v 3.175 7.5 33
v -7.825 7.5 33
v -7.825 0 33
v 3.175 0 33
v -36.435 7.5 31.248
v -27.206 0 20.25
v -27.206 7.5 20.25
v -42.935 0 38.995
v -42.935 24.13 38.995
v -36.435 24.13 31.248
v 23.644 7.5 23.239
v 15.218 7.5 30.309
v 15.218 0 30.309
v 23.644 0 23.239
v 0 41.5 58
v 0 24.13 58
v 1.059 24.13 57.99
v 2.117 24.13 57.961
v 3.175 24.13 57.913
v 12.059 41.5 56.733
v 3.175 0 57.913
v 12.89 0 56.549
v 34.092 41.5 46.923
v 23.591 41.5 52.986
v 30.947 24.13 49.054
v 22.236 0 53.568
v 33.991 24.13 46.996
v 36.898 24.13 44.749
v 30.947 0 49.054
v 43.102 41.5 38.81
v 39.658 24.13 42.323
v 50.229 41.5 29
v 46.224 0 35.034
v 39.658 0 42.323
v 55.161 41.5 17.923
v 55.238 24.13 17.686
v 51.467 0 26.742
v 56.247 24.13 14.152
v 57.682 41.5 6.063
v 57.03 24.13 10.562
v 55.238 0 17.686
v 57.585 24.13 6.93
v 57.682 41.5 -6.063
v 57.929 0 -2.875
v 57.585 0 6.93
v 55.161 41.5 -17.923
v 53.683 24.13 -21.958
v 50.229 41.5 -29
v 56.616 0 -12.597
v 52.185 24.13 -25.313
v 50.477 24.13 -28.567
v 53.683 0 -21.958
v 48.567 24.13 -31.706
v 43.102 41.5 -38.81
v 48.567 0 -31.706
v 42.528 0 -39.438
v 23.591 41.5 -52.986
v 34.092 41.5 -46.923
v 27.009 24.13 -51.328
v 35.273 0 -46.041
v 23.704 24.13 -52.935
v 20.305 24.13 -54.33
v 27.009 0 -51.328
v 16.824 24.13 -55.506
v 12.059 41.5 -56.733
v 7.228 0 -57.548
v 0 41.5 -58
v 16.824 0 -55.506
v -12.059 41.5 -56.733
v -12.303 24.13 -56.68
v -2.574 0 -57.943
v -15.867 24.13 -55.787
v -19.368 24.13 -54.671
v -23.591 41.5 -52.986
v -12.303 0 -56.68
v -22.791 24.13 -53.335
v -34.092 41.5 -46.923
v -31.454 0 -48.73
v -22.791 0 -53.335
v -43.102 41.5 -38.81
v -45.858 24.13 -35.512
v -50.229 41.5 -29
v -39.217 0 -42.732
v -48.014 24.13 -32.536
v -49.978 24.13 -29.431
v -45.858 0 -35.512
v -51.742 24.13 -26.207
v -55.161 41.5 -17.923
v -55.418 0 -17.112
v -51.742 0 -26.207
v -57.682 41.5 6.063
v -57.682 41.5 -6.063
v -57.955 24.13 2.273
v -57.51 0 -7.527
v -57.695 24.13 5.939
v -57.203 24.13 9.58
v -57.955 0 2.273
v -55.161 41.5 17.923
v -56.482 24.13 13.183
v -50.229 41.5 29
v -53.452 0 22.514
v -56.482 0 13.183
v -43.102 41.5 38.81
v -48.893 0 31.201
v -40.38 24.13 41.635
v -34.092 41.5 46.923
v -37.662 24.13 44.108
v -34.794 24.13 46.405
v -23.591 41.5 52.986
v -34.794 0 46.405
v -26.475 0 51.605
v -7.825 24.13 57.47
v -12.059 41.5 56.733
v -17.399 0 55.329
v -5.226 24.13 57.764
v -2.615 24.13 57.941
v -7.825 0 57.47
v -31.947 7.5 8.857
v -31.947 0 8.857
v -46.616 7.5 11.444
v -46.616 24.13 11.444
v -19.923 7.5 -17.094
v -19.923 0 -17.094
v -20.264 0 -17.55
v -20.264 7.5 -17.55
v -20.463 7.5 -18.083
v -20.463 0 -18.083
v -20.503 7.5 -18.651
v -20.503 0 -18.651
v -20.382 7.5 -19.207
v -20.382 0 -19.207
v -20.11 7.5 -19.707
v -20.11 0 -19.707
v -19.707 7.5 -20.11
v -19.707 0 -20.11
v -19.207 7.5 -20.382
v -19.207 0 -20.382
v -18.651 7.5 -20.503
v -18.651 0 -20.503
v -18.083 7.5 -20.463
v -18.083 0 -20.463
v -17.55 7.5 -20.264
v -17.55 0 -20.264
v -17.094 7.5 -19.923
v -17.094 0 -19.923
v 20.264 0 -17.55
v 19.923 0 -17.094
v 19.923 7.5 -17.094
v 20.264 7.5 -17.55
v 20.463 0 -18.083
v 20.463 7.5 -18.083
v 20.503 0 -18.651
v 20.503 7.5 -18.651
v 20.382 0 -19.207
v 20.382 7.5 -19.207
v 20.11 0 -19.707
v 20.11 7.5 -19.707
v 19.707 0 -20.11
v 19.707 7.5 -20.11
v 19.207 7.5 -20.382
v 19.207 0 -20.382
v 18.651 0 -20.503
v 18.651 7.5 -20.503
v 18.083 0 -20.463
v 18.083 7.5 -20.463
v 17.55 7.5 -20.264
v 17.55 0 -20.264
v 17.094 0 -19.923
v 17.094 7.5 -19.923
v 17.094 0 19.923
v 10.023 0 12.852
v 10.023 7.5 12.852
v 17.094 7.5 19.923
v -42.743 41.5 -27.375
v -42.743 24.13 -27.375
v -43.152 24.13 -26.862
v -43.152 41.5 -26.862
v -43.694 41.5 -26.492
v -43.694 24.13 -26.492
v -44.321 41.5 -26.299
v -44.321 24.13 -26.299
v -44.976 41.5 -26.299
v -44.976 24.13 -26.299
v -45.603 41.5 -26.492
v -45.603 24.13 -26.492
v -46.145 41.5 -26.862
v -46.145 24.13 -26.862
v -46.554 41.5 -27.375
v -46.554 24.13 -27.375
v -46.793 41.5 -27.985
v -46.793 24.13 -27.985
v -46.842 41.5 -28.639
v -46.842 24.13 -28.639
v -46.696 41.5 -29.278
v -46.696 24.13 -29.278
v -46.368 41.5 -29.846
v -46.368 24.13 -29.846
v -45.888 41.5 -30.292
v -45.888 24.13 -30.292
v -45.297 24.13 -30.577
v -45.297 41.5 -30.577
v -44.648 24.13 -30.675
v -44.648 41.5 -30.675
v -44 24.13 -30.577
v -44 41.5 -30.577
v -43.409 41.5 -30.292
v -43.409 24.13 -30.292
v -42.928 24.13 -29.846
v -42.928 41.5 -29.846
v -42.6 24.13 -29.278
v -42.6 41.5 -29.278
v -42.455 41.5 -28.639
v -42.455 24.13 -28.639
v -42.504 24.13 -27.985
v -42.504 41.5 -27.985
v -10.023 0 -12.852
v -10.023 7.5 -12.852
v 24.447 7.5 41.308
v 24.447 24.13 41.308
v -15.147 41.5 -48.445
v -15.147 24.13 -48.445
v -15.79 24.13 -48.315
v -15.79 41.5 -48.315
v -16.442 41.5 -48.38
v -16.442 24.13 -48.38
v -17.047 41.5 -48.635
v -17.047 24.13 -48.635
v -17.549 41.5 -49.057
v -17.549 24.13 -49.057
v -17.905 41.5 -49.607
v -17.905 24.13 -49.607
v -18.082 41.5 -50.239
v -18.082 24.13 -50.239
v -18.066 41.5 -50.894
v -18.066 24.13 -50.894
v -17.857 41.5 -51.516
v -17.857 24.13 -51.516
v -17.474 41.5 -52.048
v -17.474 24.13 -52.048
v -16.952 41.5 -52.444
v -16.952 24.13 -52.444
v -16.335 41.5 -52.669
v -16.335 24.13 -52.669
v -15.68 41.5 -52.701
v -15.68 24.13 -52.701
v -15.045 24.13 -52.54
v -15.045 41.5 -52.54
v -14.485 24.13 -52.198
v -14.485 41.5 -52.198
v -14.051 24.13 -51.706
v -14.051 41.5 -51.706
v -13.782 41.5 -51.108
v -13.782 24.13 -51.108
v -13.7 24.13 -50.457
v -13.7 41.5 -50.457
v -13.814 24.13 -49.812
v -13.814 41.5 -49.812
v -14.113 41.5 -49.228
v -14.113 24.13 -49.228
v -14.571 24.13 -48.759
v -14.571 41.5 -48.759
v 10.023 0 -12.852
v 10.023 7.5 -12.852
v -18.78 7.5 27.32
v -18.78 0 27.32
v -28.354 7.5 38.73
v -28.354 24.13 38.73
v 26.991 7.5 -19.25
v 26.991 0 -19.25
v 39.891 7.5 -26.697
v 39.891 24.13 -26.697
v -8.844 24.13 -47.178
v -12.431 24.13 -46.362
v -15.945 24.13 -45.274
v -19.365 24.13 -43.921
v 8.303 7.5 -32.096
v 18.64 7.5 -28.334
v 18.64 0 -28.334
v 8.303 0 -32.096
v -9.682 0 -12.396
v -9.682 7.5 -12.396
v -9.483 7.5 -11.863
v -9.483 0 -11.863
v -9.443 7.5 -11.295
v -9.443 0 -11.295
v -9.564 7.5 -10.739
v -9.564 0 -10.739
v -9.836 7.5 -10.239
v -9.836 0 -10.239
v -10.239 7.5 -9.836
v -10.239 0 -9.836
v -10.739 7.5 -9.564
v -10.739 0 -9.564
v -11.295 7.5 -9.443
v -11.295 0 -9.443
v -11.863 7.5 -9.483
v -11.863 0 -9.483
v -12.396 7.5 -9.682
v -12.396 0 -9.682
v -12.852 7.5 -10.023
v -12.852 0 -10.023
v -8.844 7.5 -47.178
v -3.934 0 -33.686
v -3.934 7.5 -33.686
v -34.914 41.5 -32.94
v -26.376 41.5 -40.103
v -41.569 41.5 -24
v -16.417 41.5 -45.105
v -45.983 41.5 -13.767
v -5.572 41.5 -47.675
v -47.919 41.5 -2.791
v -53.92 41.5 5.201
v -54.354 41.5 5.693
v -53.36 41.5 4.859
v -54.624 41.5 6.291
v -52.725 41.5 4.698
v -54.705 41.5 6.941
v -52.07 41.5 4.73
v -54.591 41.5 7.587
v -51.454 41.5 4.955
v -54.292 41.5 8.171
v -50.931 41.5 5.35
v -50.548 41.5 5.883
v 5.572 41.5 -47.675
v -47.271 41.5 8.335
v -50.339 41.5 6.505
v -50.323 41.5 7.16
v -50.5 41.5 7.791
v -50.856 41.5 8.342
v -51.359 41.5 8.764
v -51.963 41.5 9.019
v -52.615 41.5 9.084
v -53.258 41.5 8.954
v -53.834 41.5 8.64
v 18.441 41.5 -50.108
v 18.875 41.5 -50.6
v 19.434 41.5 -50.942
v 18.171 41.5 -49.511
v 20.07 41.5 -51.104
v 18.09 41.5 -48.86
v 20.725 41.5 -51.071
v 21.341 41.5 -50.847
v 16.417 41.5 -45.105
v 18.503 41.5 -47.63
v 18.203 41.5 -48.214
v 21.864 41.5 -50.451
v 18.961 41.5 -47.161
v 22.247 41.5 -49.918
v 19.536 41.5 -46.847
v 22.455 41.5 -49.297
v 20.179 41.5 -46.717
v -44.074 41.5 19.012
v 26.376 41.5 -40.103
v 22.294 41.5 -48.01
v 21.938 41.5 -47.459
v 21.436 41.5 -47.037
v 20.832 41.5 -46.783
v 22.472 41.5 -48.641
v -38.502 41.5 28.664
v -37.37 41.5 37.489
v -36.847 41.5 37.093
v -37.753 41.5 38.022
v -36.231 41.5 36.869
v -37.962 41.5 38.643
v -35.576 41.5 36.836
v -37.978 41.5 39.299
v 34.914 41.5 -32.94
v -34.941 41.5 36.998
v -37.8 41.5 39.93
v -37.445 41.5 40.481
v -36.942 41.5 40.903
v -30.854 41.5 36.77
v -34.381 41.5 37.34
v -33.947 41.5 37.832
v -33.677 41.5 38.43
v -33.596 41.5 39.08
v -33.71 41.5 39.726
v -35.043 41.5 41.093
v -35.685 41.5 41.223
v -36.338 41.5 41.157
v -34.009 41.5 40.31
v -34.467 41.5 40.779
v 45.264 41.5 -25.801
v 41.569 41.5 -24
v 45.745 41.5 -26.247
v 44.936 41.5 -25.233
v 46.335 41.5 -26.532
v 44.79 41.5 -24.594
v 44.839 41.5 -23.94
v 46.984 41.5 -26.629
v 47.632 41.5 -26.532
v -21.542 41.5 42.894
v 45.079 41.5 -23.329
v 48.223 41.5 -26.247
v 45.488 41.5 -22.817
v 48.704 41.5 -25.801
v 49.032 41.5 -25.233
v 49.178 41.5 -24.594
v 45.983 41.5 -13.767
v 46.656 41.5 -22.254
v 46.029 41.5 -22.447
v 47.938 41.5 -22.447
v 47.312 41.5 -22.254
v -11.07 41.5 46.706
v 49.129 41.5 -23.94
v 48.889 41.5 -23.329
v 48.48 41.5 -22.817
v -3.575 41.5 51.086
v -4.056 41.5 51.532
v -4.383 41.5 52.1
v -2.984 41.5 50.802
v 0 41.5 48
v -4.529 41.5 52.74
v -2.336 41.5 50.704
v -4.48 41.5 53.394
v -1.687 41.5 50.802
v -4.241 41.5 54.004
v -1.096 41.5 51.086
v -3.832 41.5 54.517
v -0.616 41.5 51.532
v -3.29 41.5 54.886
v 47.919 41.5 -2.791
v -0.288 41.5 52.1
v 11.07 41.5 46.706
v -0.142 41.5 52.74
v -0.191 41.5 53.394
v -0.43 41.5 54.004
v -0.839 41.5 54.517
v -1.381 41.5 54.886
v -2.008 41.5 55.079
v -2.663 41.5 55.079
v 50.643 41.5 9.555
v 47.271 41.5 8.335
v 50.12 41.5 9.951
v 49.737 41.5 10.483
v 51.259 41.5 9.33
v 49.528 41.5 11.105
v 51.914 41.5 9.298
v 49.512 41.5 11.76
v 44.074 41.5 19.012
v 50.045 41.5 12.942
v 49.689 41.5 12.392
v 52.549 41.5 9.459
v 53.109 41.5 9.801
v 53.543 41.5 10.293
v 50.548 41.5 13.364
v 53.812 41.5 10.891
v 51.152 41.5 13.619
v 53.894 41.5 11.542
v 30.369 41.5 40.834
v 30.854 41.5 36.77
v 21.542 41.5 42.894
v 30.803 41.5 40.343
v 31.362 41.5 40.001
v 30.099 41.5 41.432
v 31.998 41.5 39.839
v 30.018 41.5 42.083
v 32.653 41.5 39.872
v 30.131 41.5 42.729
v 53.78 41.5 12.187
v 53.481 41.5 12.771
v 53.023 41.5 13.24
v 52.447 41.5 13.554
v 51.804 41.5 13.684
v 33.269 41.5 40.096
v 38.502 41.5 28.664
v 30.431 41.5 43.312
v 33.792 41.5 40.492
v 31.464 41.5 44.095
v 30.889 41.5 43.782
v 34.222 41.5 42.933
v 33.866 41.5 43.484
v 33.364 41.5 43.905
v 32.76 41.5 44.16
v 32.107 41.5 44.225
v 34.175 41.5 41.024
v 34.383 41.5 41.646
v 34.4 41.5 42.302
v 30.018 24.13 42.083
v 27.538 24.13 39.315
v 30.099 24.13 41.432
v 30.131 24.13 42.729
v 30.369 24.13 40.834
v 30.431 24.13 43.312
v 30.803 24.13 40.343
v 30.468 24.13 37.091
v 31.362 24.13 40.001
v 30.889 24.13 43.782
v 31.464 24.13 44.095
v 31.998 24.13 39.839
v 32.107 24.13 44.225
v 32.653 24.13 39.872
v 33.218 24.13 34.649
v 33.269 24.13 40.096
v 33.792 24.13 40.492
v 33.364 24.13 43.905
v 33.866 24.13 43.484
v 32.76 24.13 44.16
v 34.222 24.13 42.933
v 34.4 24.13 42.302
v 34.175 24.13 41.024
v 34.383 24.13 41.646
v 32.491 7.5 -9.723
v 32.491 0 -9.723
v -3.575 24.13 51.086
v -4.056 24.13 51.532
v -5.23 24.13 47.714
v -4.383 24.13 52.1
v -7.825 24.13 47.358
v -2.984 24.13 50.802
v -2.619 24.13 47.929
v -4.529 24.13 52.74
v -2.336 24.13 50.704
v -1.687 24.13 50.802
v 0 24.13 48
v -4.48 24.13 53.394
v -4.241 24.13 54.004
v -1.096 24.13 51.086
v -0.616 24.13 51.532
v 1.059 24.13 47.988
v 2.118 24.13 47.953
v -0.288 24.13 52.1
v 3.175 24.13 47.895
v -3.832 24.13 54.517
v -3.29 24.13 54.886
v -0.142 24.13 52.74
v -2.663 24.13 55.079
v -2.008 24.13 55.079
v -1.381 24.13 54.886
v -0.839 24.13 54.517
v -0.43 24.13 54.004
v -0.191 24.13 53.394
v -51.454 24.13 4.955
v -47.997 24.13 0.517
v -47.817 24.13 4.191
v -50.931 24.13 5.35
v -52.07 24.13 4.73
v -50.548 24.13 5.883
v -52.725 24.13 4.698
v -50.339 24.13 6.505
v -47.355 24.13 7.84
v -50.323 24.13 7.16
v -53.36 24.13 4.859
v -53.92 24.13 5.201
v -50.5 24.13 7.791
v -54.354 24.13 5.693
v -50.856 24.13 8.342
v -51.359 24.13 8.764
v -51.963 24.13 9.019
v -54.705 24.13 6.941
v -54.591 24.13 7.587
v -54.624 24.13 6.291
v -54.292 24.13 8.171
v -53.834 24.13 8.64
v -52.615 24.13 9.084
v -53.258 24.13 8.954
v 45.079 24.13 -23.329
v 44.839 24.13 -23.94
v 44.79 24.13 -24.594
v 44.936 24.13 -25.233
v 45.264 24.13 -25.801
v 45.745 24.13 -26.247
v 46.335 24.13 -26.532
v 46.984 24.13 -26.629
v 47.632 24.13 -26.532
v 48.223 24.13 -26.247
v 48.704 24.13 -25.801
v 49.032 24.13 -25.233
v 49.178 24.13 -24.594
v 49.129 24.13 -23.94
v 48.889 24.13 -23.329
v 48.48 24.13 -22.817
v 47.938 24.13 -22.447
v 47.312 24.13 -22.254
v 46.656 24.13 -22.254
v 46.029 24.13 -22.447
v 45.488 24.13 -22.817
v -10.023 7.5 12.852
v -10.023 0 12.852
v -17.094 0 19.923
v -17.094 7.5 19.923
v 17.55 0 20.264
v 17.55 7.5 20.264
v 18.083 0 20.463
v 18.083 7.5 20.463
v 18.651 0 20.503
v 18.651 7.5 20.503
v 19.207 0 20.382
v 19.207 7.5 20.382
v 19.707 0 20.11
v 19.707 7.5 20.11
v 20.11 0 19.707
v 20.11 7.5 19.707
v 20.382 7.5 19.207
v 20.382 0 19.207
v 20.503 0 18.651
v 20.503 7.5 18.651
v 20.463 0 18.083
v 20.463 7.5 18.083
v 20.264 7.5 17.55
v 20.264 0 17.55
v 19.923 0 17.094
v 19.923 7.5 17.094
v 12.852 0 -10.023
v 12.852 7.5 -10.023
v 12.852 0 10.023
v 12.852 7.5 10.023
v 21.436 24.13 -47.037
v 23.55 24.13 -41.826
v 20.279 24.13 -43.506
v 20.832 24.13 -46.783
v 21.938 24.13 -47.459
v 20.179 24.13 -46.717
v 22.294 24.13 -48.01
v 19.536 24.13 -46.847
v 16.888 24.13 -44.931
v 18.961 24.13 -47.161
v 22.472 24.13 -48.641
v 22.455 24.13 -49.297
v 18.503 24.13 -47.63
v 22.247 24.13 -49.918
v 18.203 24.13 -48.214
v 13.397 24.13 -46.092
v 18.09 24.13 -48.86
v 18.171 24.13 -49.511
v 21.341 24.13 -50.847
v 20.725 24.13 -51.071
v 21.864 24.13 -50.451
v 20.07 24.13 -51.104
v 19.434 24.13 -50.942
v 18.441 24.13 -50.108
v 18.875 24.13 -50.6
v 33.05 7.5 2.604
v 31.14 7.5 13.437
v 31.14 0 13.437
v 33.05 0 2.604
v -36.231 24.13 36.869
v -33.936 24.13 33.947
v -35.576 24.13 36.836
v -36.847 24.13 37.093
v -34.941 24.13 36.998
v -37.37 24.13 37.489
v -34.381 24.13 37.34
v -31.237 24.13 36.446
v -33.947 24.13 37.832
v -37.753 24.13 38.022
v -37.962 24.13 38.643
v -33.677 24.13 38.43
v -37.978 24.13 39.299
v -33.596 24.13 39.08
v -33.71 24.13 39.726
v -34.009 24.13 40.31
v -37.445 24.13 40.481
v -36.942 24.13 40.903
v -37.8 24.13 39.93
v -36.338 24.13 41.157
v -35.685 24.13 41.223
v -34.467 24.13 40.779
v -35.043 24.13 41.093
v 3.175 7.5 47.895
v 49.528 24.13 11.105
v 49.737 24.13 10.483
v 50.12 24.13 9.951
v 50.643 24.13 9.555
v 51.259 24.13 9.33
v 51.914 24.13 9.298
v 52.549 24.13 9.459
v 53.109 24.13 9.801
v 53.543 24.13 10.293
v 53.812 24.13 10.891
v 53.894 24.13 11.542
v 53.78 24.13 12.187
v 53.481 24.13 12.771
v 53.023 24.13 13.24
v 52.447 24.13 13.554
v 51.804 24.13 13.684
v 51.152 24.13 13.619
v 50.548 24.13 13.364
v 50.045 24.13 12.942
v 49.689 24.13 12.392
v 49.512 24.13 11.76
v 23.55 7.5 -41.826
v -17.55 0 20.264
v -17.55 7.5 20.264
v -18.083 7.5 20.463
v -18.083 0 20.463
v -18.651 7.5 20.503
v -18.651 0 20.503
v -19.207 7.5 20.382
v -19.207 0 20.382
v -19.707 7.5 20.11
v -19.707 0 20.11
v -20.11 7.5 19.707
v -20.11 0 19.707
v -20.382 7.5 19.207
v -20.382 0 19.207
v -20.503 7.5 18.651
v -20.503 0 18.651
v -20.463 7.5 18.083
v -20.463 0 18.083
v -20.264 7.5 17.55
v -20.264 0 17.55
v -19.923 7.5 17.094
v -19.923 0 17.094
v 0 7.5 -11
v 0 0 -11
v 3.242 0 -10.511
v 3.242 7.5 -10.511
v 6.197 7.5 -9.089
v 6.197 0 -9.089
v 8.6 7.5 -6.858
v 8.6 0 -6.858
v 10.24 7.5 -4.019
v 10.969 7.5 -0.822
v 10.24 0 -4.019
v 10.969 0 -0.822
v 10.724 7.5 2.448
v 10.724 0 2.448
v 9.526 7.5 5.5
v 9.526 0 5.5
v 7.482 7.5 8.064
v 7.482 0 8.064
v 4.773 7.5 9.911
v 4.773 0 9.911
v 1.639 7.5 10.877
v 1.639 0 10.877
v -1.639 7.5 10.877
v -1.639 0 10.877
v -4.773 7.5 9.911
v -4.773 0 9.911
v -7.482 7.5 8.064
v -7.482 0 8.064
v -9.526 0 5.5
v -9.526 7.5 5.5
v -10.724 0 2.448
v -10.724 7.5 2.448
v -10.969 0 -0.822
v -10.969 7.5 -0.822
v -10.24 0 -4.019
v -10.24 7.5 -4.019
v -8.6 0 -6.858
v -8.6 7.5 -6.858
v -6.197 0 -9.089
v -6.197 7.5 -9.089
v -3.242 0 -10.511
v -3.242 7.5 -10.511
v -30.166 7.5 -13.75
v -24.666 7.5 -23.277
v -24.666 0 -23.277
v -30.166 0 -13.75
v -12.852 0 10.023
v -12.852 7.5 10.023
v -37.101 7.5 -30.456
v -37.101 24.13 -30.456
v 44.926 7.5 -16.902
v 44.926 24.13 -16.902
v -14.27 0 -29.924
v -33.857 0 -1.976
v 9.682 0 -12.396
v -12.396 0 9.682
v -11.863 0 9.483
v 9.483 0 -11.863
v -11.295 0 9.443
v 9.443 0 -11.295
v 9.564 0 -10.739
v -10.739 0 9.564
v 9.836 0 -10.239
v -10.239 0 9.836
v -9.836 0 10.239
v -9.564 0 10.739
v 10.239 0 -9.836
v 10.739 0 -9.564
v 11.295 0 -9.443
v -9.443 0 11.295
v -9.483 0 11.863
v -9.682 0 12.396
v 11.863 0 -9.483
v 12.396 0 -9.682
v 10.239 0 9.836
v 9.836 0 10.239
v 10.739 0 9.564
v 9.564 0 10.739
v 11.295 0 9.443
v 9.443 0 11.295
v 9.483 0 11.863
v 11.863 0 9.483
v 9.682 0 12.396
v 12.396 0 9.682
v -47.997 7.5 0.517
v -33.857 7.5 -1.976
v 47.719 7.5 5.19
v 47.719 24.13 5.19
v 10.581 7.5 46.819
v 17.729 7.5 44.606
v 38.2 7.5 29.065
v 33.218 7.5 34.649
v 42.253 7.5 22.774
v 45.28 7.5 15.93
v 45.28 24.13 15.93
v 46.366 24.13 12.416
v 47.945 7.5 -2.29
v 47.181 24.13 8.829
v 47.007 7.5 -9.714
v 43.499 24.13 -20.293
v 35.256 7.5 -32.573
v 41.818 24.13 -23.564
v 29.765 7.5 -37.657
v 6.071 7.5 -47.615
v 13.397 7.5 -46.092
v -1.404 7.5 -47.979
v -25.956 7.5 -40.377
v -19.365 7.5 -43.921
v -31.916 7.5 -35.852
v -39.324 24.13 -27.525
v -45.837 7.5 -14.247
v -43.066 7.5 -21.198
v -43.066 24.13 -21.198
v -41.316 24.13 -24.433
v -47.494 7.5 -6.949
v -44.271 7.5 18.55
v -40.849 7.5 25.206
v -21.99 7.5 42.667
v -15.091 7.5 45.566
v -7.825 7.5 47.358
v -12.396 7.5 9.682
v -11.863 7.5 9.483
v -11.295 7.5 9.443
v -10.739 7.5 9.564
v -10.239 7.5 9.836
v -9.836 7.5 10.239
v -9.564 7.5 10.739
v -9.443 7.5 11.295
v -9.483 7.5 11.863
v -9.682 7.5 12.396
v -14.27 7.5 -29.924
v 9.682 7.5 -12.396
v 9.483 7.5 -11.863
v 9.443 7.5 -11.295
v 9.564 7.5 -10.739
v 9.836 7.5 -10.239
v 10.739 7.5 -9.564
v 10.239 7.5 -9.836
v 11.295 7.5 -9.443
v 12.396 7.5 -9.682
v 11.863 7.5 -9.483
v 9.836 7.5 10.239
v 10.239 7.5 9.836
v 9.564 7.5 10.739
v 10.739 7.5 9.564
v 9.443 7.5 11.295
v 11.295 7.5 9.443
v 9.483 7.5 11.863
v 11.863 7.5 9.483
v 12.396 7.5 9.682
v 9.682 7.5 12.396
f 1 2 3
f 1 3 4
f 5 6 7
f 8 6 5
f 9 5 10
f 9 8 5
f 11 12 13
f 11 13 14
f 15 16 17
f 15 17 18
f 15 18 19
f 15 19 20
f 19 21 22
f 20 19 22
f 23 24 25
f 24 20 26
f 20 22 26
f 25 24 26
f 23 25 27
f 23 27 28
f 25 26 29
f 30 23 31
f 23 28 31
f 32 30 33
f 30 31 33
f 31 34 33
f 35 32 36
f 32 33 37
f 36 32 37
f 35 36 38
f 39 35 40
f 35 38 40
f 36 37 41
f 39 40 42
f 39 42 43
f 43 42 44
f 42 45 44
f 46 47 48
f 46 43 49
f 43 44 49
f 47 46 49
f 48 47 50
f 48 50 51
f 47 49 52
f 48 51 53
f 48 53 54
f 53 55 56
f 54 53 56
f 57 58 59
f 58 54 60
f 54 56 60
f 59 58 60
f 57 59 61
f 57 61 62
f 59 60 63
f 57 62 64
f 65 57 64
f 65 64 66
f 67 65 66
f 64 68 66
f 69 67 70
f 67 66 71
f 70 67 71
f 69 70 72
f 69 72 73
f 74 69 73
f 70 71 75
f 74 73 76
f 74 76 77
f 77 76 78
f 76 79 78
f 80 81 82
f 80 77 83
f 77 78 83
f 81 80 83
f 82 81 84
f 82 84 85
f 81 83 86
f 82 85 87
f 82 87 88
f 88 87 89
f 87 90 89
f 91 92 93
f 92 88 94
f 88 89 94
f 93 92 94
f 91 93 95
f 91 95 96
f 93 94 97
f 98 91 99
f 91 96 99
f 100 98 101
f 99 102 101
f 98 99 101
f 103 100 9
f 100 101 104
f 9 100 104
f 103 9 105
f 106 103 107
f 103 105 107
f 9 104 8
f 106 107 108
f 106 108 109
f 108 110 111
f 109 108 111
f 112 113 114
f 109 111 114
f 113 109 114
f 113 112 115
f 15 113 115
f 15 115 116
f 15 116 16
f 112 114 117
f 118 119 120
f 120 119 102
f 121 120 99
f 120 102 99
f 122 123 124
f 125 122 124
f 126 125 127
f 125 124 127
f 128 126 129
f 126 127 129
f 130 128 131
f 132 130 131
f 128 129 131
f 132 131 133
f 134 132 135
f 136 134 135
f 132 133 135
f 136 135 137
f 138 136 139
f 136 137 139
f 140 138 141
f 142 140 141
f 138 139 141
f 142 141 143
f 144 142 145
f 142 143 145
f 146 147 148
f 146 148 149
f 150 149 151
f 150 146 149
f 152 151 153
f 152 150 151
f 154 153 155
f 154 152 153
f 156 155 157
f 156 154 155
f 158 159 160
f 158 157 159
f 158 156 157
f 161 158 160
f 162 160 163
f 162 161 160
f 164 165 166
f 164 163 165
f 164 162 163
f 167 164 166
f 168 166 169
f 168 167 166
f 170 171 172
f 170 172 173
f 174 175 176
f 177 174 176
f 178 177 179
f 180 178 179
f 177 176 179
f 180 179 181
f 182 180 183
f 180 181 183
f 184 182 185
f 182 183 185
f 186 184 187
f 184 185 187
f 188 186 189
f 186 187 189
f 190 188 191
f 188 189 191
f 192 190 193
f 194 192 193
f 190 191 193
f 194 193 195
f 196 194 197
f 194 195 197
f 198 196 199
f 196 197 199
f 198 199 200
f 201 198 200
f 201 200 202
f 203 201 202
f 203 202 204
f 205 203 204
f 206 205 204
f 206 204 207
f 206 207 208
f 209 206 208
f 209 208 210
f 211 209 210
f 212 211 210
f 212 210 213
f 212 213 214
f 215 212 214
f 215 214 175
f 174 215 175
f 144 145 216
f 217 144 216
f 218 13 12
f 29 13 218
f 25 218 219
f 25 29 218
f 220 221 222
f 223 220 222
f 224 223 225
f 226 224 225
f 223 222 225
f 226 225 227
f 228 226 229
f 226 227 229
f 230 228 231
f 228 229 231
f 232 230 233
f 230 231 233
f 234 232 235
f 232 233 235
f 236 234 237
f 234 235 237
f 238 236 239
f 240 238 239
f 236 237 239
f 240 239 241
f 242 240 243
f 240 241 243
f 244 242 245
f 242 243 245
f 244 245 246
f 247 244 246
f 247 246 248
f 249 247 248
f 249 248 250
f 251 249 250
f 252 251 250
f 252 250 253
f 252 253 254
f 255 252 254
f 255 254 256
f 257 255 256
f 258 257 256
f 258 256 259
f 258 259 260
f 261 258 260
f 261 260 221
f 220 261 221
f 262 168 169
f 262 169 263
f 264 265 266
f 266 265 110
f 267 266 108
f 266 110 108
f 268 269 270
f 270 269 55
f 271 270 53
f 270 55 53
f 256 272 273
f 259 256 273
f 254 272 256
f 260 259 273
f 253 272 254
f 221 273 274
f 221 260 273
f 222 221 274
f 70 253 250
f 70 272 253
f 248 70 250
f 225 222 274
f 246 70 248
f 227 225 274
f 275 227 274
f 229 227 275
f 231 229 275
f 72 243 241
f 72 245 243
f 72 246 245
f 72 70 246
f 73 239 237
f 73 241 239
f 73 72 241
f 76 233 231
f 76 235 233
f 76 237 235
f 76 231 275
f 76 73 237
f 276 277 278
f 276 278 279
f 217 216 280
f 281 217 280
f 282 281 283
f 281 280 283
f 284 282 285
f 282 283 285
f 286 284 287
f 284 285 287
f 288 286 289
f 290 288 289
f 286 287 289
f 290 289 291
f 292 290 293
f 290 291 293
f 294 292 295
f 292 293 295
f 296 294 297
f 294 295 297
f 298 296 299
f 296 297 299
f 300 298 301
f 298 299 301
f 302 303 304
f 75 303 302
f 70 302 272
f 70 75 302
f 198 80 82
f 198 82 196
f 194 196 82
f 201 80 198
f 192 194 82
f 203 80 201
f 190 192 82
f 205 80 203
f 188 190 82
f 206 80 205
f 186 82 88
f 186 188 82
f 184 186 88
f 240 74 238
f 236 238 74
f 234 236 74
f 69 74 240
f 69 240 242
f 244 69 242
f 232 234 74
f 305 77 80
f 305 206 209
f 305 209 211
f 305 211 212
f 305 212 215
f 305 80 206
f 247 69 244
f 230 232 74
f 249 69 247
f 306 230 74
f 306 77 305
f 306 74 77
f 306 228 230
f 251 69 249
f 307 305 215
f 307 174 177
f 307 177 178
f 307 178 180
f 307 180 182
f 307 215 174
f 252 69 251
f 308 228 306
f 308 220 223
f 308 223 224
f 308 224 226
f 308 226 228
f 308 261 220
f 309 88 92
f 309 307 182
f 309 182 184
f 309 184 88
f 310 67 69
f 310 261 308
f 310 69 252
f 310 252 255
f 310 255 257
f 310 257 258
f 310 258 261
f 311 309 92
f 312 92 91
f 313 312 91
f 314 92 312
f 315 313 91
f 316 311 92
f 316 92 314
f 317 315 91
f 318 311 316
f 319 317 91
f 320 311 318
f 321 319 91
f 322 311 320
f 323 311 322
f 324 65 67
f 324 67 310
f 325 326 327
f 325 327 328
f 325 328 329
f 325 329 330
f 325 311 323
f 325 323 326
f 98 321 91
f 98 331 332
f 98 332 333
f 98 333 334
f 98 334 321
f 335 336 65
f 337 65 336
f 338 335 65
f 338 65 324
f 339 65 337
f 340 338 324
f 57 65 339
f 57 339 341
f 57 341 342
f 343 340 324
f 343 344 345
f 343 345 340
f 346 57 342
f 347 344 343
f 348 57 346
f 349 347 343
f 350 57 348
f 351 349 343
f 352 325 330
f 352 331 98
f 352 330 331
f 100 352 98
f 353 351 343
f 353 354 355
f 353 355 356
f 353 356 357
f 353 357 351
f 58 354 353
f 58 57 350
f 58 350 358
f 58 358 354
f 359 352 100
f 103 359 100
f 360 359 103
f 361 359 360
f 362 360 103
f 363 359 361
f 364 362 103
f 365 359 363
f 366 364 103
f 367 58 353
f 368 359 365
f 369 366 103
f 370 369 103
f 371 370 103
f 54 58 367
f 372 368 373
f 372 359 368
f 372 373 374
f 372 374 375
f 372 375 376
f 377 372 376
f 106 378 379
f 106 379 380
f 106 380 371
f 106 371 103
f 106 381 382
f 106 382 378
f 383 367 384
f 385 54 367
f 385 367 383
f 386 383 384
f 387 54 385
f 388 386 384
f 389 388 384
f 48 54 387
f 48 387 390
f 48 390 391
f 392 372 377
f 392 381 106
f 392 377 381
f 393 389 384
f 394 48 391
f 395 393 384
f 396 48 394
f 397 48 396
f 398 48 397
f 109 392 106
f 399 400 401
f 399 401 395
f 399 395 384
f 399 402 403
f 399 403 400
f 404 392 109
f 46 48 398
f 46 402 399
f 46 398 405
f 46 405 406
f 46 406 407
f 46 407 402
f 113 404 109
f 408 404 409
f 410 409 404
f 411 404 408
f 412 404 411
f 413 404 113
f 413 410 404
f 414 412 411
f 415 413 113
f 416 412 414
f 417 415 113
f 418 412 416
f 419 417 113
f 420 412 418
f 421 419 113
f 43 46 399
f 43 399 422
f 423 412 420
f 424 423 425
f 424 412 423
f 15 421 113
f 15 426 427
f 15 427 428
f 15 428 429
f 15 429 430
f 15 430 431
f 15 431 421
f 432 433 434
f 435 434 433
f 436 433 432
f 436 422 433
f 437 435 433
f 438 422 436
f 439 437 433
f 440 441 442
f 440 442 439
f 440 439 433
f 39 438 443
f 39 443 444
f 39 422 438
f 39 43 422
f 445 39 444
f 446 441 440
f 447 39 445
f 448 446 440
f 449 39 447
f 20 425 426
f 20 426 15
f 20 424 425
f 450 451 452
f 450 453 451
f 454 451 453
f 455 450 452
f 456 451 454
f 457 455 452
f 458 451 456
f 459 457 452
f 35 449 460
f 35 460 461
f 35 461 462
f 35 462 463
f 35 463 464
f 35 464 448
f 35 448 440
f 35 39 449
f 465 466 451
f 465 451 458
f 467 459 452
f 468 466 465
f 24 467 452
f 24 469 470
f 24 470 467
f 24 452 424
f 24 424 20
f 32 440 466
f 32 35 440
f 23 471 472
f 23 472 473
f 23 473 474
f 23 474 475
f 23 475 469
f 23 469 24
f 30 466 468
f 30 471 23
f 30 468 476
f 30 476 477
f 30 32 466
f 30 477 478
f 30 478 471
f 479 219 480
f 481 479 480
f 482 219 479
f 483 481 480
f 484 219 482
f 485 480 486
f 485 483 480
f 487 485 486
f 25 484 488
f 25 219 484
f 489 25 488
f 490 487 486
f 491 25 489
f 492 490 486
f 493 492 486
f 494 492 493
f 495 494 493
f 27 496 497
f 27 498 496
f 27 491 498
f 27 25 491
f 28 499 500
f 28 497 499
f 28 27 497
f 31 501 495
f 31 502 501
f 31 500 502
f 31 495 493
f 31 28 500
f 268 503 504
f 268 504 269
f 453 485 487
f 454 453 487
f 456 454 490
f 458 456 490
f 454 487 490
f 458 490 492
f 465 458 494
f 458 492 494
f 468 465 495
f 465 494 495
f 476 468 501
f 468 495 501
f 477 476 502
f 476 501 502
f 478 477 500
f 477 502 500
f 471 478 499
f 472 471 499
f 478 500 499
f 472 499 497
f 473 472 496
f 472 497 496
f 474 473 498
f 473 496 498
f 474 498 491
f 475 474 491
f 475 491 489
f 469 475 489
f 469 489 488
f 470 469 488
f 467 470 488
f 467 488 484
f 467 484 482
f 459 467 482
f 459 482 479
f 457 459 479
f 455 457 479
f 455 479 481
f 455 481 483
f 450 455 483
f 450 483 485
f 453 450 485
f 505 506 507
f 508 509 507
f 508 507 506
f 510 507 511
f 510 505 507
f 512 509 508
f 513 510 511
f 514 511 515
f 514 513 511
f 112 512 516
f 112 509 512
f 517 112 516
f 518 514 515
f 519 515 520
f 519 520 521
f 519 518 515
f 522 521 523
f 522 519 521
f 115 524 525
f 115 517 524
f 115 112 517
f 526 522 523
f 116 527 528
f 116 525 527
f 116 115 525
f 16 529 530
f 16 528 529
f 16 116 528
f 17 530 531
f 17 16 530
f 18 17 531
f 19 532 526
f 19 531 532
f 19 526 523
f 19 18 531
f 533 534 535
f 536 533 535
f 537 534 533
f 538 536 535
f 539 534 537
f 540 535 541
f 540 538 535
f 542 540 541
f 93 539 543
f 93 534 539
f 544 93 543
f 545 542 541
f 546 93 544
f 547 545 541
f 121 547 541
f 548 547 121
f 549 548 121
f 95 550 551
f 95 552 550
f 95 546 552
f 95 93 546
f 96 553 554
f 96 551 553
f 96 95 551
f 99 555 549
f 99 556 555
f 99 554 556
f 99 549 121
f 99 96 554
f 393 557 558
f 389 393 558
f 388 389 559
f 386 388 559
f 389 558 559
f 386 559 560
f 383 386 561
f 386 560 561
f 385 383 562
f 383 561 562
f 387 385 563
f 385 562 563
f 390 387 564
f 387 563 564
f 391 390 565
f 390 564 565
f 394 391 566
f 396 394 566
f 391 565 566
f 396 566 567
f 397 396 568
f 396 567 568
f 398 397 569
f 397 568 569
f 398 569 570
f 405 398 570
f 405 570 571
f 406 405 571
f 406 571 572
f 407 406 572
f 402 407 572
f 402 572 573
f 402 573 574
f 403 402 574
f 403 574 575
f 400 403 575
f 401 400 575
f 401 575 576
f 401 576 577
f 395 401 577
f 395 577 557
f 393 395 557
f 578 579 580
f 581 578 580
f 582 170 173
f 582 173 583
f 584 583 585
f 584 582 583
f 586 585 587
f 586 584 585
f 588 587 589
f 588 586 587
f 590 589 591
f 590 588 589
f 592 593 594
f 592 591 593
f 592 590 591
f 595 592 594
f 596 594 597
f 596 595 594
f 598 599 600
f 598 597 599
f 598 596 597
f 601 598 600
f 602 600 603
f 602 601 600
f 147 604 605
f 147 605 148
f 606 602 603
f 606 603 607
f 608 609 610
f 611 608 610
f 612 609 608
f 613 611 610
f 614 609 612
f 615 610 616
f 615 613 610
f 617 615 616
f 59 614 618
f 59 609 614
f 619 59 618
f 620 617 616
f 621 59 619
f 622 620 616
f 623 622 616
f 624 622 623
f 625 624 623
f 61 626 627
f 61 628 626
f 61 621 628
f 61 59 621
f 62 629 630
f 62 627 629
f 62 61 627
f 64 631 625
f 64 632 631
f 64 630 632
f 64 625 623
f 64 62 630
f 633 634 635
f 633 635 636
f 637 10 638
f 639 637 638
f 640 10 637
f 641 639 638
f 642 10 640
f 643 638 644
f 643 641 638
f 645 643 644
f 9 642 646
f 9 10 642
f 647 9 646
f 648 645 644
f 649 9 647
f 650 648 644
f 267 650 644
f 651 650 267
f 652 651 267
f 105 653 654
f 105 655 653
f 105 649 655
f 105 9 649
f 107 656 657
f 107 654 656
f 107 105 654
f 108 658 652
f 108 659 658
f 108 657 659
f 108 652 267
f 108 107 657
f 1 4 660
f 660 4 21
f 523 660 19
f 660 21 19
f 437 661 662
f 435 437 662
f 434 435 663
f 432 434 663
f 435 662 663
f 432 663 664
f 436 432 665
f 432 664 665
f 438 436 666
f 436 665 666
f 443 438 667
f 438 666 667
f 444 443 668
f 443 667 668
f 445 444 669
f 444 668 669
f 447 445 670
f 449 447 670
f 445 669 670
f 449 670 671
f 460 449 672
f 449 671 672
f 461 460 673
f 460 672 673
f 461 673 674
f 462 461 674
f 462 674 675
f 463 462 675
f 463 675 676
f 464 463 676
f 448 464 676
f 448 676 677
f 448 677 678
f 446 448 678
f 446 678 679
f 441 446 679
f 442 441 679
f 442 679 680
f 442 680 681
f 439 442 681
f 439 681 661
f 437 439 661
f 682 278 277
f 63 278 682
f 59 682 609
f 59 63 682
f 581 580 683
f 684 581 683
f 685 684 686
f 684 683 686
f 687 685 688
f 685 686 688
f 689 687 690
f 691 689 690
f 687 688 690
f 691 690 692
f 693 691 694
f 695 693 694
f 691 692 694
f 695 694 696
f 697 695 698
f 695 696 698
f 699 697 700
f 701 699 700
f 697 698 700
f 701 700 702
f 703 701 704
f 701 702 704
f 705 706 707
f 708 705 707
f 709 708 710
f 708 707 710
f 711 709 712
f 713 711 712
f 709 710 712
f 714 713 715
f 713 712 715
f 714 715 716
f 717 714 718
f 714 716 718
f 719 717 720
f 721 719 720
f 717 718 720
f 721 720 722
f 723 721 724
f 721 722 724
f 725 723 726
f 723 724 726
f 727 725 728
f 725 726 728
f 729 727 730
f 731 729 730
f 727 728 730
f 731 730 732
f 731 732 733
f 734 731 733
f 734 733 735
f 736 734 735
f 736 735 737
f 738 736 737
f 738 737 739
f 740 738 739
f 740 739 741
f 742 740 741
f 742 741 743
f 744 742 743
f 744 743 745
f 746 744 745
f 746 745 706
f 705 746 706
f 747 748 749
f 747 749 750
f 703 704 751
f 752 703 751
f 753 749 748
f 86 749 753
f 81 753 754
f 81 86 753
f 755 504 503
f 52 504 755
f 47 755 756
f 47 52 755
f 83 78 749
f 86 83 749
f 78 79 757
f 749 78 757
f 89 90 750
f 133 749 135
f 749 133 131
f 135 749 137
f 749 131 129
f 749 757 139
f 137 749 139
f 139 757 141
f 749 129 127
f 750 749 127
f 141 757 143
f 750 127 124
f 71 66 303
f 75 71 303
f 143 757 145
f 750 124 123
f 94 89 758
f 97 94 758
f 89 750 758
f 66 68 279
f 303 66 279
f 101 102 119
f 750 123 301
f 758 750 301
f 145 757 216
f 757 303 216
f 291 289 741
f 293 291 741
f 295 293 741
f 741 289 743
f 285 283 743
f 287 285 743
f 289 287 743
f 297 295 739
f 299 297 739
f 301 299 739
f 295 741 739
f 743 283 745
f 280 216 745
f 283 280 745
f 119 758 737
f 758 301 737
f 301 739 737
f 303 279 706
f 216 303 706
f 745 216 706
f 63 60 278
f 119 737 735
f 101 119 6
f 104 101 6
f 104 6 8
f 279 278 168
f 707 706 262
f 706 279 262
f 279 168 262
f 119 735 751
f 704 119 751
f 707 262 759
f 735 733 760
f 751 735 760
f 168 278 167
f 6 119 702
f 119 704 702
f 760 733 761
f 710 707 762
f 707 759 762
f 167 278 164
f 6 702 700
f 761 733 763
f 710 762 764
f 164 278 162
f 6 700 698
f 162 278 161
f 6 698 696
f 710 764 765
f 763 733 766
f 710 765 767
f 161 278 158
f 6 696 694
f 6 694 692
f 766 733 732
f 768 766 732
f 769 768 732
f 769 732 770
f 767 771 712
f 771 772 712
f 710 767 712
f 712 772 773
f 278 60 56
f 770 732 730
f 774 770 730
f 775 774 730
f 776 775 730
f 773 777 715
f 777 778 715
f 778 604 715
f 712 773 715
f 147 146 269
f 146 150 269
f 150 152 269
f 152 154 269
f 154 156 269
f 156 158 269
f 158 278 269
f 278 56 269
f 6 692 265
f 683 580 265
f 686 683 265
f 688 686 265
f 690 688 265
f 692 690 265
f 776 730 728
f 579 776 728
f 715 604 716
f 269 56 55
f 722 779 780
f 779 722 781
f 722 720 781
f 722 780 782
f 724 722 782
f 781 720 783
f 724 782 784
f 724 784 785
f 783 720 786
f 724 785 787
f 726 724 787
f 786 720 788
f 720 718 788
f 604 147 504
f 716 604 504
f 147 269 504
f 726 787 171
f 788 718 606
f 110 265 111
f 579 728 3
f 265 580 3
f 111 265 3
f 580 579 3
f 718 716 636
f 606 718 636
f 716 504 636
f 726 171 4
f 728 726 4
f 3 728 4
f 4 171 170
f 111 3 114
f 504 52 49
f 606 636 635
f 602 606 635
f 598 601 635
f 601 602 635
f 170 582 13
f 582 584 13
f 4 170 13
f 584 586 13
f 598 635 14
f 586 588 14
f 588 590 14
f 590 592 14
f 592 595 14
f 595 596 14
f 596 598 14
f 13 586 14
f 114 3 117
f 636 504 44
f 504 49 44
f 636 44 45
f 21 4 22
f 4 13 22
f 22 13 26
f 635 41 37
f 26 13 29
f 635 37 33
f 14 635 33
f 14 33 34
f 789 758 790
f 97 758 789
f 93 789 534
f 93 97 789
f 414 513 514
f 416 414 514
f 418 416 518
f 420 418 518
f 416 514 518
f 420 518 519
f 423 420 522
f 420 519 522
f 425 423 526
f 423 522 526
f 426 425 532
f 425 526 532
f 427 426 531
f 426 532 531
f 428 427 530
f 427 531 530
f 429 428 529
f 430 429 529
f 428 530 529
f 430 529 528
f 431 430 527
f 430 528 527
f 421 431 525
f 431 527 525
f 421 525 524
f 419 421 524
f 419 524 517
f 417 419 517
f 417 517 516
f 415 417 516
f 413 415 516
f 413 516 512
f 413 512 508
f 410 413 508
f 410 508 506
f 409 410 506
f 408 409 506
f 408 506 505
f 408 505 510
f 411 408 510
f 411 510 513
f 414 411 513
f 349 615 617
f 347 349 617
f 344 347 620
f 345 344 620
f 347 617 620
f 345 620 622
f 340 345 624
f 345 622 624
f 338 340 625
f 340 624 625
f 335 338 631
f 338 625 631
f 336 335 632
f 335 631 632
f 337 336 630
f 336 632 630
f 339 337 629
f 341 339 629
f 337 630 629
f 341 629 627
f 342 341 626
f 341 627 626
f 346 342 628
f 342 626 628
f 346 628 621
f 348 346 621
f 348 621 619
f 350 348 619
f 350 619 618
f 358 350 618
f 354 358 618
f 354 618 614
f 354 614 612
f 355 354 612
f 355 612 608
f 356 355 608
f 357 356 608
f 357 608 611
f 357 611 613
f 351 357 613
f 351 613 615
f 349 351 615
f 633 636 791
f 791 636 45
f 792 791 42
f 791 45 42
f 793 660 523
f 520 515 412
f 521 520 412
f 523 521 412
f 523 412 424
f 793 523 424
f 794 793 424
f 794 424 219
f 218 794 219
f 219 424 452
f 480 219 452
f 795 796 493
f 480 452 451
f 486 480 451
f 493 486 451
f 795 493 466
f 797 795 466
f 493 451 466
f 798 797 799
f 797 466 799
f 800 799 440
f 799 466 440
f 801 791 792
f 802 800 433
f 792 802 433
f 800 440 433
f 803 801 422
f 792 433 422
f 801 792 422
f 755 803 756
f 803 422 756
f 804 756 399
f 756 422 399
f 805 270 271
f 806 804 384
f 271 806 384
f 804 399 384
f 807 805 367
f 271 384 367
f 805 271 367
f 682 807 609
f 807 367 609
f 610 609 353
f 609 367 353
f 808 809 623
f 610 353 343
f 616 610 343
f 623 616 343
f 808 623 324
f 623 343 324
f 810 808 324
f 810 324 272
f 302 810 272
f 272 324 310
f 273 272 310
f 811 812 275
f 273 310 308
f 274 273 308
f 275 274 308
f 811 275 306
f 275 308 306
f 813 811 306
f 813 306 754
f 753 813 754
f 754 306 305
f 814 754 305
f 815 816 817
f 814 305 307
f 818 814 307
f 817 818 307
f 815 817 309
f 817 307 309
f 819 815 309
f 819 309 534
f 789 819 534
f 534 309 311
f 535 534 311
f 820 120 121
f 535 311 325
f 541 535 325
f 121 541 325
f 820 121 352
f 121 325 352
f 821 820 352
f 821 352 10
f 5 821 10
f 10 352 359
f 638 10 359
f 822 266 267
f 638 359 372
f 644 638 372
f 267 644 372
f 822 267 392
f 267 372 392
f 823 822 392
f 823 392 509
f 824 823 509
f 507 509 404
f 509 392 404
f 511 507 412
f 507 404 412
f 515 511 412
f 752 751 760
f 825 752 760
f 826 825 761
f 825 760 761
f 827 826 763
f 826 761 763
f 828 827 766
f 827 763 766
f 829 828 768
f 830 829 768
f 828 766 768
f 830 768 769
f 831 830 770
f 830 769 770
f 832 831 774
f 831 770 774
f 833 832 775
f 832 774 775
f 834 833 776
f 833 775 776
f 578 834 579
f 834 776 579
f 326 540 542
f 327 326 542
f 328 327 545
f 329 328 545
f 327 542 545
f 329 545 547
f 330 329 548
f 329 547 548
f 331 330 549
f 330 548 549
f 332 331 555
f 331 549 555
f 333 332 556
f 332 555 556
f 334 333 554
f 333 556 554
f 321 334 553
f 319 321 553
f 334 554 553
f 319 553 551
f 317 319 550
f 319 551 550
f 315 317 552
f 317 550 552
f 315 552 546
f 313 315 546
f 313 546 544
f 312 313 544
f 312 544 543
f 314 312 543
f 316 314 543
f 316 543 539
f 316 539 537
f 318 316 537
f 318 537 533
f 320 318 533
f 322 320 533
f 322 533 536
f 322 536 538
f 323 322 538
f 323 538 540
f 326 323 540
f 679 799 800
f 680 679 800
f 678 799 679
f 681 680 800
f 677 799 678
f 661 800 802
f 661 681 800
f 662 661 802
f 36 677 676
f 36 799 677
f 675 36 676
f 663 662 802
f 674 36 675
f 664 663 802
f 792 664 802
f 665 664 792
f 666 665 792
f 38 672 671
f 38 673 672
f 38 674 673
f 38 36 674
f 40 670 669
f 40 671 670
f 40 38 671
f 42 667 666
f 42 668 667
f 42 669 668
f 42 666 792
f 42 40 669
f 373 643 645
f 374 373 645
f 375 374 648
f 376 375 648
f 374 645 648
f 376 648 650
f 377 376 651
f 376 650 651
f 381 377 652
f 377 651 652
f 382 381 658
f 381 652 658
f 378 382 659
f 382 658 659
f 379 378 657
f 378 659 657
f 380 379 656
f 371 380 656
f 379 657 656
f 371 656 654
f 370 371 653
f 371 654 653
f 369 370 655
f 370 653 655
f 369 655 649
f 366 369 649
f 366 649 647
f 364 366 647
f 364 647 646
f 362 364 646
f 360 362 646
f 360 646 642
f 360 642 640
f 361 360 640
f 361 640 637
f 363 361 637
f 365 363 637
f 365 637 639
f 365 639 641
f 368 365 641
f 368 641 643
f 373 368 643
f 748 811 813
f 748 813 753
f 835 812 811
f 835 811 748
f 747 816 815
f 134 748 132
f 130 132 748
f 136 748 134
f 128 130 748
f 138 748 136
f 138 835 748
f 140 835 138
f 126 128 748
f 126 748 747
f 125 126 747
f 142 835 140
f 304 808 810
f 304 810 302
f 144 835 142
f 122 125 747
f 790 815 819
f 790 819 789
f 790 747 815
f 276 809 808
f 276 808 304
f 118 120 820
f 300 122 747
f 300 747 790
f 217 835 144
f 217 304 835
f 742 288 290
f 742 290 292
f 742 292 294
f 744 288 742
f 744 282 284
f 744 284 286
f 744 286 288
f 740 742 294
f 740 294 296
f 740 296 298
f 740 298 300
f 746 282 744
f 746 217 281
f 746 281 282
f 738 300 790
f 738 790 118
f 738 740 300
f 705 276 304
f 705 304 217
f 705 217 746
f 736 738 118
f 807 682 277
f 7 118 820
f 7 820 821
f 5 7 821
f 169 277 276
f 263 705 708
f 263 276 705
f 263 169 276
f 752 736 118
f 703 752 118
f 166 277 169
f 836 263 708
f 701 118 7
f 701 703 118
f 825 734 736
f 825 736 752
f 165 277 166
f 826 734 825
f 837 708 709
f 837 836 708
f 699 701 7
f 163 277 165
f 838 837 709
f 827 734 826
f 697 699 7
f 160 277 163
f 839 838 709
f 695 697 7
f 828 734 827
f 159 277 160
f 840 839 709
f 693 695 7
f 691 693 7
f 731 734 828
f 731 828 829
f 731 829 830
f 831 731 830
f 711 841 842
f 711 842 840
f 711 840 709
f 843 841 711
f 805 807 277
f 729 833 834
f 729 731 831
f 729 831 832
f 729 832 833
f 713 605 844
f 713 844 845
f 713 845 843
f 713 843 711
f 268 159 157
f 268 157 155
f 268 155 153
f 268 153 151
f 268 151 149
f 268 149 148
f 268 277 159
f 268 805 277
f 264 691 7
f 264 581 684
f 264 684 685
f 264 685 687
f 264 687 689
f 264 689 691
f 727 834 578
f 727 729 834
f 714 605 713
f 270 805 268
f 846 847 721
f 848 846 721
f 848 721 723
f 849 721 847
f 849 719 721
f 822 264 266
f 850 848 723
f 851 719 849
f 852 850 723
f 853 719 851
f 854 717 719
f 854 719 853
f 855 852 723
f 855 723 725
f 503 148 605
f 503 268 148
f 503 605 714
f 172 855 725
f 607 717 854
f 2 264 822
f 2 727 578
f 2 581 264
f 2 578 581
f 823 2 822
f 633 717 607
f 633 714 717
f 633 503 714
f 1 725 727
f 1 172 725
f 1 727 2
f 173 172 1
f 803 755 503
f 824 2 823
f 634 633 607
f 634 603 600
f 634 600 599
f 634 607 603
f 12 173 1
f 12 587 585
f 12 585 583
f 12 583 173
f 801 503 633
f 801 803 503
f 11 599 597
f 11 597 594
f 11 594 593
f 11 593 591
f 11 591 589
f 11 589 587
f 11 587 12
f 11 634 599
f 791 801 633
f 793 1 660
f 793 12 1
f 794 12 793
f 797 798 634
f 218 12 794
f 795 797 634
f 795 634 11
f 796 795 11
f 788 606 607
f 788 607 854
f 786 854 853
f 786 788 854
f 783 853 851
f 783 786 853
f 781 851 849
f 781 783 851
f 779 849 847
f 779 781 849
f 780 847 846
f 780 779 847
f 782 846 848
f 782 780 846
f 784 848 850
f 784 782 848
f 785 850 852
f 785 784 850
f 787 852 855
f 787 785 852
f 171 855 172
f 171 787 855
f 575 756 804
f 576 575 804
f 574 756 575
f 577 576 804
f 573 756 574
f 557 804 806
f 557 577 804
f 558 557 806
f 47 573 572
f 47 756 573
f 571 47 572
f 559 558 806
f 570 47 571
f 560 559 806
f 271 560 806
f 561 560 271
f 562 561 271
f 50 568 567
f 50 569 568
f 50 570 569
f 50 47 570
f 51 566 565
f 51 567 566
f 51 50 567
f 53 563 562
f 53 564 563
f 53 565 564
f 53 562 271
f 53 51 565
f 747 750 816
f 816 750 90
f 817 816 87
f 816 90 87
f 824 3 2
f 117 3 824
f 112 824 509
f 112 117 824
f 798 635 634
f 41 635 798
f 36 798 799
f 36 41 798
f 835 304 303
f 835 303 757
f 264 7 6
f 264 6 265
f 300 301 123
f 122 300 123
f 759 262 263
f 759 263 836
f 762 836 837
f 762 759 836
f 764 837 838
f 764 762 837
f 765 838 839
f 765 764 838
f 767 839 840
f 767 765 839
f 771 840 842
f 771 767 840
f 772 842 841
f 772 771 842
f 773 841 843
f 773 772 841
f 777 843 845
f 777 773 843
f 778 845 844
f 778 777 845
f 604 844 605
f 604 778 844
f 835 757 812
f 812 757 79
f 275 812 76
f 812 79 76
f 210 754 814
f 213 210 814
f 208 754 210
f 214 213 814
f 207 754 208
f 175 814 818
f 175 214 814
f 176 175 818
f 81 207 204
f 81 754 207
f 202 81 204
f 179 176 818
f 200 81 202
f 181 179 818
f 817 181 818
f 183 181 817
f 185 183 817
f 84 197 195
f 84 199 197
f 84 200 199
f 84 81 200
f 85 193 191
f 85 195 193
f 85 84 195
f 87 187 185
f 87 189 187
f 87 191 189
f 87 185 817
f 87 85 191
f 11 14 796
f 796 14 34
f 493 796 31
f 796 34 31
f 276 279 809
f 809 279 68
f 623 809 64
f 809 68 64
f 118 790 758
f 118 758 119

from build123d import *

# Parameters (mm, degrees)
SKETCH2_R           = 58
BOSS_EXTRUDE1_DEPTH = 41.5
SKETCH3_R           = 48
CUT_EXTRUDE1_DEPTH  = 34
SKETCH4_R           = 3.175
CUT_EXTRUDE2_DEPTH  = 89.791891522
CUT_EXTRUDE3_DEPTH  = 92.925241365
SKETCH6_W           = 11
SKETCH6_H           = 25.4
CUT_EXTRUDE4_DEPTH  = 25
CIRPATTERN1_COUNT   = 9
SKETCH7_R           = 2.2
CUT_EXTRUDE5_DEPTH  = 86.500040351
CIRPATTERN2_COUNT   = 9
SKETCH8_R           = 11
CUT_EXTRUDE6_DEPTH  = 92.925241365


with BuildPart() as part:
    # Sketch2 → Boss-Extrude1 (new body)
    with BuildSketch(Plane(origin=(0, 0, 0), x_dir=(1, 0, 0), z_dir=(0, 1, 0))):
        with Locations(Location((0, 0, 0), (0, 0, 270))):
            Circle(SKETCH2_R)
    extrude(amount=BOSS_EXTRUDE1_DEPTH)

    # Sketch3 → Cut-Extrude1 (cut)
    with BuildSketch(Plane(origin=(0, 41.5, 0), x_dir=(1, 0, 0), z_dir=(0, 1, 0))):
        with Locations(Location((0, 0, 0), (0, 0, 270))):
            Circle(SKETCH3_R)
    extrude(amount=-CUT_EXTRUDE1_DEPTH, mode=Mode.SUBTRACT)

    # Sketch4 → Cut-Extrude2 (cut, through all)
    with BuildSketch(Plane(origin=(0, 7.5, 0), x_dir=(1, 0, 0), z_dir=(0, 1, 0))):
        with Locations(Location((0, 0, 0), (0, 0, 270))):
            Circle(SKETCH4_R)
    extrude(amount=-CUT_EXTRUDE2_DEPTH, mode=Mode.SUBTRACT)

    # Sketch5 → Cut-Extrude3 (cut, through all)
    with BuildSketch(Plane.XZ):
        with BuildLine():
            Line((12.851665748, -10.023238623), (19.92273356, -17.094306435))
            ThreePointArc((19.92273356, -17.094306435), (19.92273356, -19.92273356), (17.094306435, -19.92273356))
            Line((17.094306435, -19.92273356), (10.023238623, -12.851665748))
            ThreePointArc((10.023238623, -12.851665748), (10.023238623, -10.023238623), (12.851665748, -10.023238623))
        make_face()
        with BuildLine():
            Line((10.023238623, 12.851665748), (17.094306435, 19.92273356))
            ThreePointArc((17.094306435, 19.92273356), (19.92273356, 19.92273356), (19.92273356, 17.094306435))
            Line((19.92273356, 17.094306435), (12.851665748, 10.023238623))
            ThreePointArc((12.851665748, 10.023238623), (10.023238623, 10.023238623), (10.023238623, 12.851665748))
        make_face()
        with BuildLine():
            Line((-10.023238623, 12.851665748), (-17.094306435, 19.92273356))
            ThreePointArc((-17.094306435, 19.92273356), (-19.92273356, 19.92273356), (-19.92273356, 17.094306435))
            Line((-19.92273356, 17.094306435), (-12.851665748, 10.023238623))
            ThreePointArc((-12.851665748, 10.023238623), (-10.023238623, 10.023238623), (-10.023238623, 12.851665748))
        make_face()
        with BuildLine():
            Line((-12.851665748, -10.023238623), (-19.92273356, -17.094306435))
            ThreePointArc((-19.92273356, -17.094306435), (-19.92273356, -19.92273356), (-17.094306435, -19.92273356))
            Line((-17.094306435, -19.92273356), (-10.023238623, -12.851665748))
            ThreePointArc((-10.023238623, -12.851665748), (-10.023238623, -10.023238623), (-12.851665748, -10.023238623))
        make_face()
    extrude(amount=-CUT_EXTRUDE3_DEPTH, mode=Mode.SUBTRACT)

    # Sketch6 → Cut-Extrude4 (cut)
    with BuildSketch(Plane.XY.offset(58.000000078)):
        with Locations((-2.325, 11.43)):
            Rectangle(SKETCH6_W, SKETCH6_H)
    cut_extrude4 = extrude(amount=-CUT_EXTRUDE4_DEPTH, mode=Mode.SUBTRACT)

    # CirPattern1: Cut-Extrude4 ×9 about axis
    cirpattern1_axis = Axis((0, 0, 0), (0, 1, 0))
    for i in range(1, CIRPATTERN1_COUNT):
        add(cut_extrude4.rotate(cirpattern1_axis, i * 360 / CIRPATTERN1_COUNT), mode=Mode.SUBTRACT)

    # Sketch7 → Cut-Extrude5 (cut, through all)
    with BuildSketch(Plane.XZ.offset(-24.13)):
        with Locations(Location((-2.335541758, 52.90395562, 0), (0, 0, 270))):
            Circle(SKETCH7_R)
    cut_extrude5 = extrude(amount=-CUT_EXTRUDE5_DEPTH, mode=Mode.SUBTRACT)

    # CirPattern2: Cut-Extrude5 ×9 about axis
    cirpattern2_axis = Axis((0, 0, 0), (0, 1, 0))
    for i in range(1, CIRPATTERN2_COUNT):
        add(cut_extrude5.rotate(cirpattern2_axis, i * 360 / CIRPATTERN2_COUNT), mode=Mode.SUBTRACT)

    # Sketch8 → Cut-Extrude6 (cut, through all)
    with BuildSketch(Plane.XZ):
        with Locations(Location((0, 0, 0), (0, 0, 270))):
            Circle(SKETCH8_R)
    extrude(amount=-CUT_EXTRUDE6_DEPTH, mode=Mode.SUBTRACT)


solid = part.part
